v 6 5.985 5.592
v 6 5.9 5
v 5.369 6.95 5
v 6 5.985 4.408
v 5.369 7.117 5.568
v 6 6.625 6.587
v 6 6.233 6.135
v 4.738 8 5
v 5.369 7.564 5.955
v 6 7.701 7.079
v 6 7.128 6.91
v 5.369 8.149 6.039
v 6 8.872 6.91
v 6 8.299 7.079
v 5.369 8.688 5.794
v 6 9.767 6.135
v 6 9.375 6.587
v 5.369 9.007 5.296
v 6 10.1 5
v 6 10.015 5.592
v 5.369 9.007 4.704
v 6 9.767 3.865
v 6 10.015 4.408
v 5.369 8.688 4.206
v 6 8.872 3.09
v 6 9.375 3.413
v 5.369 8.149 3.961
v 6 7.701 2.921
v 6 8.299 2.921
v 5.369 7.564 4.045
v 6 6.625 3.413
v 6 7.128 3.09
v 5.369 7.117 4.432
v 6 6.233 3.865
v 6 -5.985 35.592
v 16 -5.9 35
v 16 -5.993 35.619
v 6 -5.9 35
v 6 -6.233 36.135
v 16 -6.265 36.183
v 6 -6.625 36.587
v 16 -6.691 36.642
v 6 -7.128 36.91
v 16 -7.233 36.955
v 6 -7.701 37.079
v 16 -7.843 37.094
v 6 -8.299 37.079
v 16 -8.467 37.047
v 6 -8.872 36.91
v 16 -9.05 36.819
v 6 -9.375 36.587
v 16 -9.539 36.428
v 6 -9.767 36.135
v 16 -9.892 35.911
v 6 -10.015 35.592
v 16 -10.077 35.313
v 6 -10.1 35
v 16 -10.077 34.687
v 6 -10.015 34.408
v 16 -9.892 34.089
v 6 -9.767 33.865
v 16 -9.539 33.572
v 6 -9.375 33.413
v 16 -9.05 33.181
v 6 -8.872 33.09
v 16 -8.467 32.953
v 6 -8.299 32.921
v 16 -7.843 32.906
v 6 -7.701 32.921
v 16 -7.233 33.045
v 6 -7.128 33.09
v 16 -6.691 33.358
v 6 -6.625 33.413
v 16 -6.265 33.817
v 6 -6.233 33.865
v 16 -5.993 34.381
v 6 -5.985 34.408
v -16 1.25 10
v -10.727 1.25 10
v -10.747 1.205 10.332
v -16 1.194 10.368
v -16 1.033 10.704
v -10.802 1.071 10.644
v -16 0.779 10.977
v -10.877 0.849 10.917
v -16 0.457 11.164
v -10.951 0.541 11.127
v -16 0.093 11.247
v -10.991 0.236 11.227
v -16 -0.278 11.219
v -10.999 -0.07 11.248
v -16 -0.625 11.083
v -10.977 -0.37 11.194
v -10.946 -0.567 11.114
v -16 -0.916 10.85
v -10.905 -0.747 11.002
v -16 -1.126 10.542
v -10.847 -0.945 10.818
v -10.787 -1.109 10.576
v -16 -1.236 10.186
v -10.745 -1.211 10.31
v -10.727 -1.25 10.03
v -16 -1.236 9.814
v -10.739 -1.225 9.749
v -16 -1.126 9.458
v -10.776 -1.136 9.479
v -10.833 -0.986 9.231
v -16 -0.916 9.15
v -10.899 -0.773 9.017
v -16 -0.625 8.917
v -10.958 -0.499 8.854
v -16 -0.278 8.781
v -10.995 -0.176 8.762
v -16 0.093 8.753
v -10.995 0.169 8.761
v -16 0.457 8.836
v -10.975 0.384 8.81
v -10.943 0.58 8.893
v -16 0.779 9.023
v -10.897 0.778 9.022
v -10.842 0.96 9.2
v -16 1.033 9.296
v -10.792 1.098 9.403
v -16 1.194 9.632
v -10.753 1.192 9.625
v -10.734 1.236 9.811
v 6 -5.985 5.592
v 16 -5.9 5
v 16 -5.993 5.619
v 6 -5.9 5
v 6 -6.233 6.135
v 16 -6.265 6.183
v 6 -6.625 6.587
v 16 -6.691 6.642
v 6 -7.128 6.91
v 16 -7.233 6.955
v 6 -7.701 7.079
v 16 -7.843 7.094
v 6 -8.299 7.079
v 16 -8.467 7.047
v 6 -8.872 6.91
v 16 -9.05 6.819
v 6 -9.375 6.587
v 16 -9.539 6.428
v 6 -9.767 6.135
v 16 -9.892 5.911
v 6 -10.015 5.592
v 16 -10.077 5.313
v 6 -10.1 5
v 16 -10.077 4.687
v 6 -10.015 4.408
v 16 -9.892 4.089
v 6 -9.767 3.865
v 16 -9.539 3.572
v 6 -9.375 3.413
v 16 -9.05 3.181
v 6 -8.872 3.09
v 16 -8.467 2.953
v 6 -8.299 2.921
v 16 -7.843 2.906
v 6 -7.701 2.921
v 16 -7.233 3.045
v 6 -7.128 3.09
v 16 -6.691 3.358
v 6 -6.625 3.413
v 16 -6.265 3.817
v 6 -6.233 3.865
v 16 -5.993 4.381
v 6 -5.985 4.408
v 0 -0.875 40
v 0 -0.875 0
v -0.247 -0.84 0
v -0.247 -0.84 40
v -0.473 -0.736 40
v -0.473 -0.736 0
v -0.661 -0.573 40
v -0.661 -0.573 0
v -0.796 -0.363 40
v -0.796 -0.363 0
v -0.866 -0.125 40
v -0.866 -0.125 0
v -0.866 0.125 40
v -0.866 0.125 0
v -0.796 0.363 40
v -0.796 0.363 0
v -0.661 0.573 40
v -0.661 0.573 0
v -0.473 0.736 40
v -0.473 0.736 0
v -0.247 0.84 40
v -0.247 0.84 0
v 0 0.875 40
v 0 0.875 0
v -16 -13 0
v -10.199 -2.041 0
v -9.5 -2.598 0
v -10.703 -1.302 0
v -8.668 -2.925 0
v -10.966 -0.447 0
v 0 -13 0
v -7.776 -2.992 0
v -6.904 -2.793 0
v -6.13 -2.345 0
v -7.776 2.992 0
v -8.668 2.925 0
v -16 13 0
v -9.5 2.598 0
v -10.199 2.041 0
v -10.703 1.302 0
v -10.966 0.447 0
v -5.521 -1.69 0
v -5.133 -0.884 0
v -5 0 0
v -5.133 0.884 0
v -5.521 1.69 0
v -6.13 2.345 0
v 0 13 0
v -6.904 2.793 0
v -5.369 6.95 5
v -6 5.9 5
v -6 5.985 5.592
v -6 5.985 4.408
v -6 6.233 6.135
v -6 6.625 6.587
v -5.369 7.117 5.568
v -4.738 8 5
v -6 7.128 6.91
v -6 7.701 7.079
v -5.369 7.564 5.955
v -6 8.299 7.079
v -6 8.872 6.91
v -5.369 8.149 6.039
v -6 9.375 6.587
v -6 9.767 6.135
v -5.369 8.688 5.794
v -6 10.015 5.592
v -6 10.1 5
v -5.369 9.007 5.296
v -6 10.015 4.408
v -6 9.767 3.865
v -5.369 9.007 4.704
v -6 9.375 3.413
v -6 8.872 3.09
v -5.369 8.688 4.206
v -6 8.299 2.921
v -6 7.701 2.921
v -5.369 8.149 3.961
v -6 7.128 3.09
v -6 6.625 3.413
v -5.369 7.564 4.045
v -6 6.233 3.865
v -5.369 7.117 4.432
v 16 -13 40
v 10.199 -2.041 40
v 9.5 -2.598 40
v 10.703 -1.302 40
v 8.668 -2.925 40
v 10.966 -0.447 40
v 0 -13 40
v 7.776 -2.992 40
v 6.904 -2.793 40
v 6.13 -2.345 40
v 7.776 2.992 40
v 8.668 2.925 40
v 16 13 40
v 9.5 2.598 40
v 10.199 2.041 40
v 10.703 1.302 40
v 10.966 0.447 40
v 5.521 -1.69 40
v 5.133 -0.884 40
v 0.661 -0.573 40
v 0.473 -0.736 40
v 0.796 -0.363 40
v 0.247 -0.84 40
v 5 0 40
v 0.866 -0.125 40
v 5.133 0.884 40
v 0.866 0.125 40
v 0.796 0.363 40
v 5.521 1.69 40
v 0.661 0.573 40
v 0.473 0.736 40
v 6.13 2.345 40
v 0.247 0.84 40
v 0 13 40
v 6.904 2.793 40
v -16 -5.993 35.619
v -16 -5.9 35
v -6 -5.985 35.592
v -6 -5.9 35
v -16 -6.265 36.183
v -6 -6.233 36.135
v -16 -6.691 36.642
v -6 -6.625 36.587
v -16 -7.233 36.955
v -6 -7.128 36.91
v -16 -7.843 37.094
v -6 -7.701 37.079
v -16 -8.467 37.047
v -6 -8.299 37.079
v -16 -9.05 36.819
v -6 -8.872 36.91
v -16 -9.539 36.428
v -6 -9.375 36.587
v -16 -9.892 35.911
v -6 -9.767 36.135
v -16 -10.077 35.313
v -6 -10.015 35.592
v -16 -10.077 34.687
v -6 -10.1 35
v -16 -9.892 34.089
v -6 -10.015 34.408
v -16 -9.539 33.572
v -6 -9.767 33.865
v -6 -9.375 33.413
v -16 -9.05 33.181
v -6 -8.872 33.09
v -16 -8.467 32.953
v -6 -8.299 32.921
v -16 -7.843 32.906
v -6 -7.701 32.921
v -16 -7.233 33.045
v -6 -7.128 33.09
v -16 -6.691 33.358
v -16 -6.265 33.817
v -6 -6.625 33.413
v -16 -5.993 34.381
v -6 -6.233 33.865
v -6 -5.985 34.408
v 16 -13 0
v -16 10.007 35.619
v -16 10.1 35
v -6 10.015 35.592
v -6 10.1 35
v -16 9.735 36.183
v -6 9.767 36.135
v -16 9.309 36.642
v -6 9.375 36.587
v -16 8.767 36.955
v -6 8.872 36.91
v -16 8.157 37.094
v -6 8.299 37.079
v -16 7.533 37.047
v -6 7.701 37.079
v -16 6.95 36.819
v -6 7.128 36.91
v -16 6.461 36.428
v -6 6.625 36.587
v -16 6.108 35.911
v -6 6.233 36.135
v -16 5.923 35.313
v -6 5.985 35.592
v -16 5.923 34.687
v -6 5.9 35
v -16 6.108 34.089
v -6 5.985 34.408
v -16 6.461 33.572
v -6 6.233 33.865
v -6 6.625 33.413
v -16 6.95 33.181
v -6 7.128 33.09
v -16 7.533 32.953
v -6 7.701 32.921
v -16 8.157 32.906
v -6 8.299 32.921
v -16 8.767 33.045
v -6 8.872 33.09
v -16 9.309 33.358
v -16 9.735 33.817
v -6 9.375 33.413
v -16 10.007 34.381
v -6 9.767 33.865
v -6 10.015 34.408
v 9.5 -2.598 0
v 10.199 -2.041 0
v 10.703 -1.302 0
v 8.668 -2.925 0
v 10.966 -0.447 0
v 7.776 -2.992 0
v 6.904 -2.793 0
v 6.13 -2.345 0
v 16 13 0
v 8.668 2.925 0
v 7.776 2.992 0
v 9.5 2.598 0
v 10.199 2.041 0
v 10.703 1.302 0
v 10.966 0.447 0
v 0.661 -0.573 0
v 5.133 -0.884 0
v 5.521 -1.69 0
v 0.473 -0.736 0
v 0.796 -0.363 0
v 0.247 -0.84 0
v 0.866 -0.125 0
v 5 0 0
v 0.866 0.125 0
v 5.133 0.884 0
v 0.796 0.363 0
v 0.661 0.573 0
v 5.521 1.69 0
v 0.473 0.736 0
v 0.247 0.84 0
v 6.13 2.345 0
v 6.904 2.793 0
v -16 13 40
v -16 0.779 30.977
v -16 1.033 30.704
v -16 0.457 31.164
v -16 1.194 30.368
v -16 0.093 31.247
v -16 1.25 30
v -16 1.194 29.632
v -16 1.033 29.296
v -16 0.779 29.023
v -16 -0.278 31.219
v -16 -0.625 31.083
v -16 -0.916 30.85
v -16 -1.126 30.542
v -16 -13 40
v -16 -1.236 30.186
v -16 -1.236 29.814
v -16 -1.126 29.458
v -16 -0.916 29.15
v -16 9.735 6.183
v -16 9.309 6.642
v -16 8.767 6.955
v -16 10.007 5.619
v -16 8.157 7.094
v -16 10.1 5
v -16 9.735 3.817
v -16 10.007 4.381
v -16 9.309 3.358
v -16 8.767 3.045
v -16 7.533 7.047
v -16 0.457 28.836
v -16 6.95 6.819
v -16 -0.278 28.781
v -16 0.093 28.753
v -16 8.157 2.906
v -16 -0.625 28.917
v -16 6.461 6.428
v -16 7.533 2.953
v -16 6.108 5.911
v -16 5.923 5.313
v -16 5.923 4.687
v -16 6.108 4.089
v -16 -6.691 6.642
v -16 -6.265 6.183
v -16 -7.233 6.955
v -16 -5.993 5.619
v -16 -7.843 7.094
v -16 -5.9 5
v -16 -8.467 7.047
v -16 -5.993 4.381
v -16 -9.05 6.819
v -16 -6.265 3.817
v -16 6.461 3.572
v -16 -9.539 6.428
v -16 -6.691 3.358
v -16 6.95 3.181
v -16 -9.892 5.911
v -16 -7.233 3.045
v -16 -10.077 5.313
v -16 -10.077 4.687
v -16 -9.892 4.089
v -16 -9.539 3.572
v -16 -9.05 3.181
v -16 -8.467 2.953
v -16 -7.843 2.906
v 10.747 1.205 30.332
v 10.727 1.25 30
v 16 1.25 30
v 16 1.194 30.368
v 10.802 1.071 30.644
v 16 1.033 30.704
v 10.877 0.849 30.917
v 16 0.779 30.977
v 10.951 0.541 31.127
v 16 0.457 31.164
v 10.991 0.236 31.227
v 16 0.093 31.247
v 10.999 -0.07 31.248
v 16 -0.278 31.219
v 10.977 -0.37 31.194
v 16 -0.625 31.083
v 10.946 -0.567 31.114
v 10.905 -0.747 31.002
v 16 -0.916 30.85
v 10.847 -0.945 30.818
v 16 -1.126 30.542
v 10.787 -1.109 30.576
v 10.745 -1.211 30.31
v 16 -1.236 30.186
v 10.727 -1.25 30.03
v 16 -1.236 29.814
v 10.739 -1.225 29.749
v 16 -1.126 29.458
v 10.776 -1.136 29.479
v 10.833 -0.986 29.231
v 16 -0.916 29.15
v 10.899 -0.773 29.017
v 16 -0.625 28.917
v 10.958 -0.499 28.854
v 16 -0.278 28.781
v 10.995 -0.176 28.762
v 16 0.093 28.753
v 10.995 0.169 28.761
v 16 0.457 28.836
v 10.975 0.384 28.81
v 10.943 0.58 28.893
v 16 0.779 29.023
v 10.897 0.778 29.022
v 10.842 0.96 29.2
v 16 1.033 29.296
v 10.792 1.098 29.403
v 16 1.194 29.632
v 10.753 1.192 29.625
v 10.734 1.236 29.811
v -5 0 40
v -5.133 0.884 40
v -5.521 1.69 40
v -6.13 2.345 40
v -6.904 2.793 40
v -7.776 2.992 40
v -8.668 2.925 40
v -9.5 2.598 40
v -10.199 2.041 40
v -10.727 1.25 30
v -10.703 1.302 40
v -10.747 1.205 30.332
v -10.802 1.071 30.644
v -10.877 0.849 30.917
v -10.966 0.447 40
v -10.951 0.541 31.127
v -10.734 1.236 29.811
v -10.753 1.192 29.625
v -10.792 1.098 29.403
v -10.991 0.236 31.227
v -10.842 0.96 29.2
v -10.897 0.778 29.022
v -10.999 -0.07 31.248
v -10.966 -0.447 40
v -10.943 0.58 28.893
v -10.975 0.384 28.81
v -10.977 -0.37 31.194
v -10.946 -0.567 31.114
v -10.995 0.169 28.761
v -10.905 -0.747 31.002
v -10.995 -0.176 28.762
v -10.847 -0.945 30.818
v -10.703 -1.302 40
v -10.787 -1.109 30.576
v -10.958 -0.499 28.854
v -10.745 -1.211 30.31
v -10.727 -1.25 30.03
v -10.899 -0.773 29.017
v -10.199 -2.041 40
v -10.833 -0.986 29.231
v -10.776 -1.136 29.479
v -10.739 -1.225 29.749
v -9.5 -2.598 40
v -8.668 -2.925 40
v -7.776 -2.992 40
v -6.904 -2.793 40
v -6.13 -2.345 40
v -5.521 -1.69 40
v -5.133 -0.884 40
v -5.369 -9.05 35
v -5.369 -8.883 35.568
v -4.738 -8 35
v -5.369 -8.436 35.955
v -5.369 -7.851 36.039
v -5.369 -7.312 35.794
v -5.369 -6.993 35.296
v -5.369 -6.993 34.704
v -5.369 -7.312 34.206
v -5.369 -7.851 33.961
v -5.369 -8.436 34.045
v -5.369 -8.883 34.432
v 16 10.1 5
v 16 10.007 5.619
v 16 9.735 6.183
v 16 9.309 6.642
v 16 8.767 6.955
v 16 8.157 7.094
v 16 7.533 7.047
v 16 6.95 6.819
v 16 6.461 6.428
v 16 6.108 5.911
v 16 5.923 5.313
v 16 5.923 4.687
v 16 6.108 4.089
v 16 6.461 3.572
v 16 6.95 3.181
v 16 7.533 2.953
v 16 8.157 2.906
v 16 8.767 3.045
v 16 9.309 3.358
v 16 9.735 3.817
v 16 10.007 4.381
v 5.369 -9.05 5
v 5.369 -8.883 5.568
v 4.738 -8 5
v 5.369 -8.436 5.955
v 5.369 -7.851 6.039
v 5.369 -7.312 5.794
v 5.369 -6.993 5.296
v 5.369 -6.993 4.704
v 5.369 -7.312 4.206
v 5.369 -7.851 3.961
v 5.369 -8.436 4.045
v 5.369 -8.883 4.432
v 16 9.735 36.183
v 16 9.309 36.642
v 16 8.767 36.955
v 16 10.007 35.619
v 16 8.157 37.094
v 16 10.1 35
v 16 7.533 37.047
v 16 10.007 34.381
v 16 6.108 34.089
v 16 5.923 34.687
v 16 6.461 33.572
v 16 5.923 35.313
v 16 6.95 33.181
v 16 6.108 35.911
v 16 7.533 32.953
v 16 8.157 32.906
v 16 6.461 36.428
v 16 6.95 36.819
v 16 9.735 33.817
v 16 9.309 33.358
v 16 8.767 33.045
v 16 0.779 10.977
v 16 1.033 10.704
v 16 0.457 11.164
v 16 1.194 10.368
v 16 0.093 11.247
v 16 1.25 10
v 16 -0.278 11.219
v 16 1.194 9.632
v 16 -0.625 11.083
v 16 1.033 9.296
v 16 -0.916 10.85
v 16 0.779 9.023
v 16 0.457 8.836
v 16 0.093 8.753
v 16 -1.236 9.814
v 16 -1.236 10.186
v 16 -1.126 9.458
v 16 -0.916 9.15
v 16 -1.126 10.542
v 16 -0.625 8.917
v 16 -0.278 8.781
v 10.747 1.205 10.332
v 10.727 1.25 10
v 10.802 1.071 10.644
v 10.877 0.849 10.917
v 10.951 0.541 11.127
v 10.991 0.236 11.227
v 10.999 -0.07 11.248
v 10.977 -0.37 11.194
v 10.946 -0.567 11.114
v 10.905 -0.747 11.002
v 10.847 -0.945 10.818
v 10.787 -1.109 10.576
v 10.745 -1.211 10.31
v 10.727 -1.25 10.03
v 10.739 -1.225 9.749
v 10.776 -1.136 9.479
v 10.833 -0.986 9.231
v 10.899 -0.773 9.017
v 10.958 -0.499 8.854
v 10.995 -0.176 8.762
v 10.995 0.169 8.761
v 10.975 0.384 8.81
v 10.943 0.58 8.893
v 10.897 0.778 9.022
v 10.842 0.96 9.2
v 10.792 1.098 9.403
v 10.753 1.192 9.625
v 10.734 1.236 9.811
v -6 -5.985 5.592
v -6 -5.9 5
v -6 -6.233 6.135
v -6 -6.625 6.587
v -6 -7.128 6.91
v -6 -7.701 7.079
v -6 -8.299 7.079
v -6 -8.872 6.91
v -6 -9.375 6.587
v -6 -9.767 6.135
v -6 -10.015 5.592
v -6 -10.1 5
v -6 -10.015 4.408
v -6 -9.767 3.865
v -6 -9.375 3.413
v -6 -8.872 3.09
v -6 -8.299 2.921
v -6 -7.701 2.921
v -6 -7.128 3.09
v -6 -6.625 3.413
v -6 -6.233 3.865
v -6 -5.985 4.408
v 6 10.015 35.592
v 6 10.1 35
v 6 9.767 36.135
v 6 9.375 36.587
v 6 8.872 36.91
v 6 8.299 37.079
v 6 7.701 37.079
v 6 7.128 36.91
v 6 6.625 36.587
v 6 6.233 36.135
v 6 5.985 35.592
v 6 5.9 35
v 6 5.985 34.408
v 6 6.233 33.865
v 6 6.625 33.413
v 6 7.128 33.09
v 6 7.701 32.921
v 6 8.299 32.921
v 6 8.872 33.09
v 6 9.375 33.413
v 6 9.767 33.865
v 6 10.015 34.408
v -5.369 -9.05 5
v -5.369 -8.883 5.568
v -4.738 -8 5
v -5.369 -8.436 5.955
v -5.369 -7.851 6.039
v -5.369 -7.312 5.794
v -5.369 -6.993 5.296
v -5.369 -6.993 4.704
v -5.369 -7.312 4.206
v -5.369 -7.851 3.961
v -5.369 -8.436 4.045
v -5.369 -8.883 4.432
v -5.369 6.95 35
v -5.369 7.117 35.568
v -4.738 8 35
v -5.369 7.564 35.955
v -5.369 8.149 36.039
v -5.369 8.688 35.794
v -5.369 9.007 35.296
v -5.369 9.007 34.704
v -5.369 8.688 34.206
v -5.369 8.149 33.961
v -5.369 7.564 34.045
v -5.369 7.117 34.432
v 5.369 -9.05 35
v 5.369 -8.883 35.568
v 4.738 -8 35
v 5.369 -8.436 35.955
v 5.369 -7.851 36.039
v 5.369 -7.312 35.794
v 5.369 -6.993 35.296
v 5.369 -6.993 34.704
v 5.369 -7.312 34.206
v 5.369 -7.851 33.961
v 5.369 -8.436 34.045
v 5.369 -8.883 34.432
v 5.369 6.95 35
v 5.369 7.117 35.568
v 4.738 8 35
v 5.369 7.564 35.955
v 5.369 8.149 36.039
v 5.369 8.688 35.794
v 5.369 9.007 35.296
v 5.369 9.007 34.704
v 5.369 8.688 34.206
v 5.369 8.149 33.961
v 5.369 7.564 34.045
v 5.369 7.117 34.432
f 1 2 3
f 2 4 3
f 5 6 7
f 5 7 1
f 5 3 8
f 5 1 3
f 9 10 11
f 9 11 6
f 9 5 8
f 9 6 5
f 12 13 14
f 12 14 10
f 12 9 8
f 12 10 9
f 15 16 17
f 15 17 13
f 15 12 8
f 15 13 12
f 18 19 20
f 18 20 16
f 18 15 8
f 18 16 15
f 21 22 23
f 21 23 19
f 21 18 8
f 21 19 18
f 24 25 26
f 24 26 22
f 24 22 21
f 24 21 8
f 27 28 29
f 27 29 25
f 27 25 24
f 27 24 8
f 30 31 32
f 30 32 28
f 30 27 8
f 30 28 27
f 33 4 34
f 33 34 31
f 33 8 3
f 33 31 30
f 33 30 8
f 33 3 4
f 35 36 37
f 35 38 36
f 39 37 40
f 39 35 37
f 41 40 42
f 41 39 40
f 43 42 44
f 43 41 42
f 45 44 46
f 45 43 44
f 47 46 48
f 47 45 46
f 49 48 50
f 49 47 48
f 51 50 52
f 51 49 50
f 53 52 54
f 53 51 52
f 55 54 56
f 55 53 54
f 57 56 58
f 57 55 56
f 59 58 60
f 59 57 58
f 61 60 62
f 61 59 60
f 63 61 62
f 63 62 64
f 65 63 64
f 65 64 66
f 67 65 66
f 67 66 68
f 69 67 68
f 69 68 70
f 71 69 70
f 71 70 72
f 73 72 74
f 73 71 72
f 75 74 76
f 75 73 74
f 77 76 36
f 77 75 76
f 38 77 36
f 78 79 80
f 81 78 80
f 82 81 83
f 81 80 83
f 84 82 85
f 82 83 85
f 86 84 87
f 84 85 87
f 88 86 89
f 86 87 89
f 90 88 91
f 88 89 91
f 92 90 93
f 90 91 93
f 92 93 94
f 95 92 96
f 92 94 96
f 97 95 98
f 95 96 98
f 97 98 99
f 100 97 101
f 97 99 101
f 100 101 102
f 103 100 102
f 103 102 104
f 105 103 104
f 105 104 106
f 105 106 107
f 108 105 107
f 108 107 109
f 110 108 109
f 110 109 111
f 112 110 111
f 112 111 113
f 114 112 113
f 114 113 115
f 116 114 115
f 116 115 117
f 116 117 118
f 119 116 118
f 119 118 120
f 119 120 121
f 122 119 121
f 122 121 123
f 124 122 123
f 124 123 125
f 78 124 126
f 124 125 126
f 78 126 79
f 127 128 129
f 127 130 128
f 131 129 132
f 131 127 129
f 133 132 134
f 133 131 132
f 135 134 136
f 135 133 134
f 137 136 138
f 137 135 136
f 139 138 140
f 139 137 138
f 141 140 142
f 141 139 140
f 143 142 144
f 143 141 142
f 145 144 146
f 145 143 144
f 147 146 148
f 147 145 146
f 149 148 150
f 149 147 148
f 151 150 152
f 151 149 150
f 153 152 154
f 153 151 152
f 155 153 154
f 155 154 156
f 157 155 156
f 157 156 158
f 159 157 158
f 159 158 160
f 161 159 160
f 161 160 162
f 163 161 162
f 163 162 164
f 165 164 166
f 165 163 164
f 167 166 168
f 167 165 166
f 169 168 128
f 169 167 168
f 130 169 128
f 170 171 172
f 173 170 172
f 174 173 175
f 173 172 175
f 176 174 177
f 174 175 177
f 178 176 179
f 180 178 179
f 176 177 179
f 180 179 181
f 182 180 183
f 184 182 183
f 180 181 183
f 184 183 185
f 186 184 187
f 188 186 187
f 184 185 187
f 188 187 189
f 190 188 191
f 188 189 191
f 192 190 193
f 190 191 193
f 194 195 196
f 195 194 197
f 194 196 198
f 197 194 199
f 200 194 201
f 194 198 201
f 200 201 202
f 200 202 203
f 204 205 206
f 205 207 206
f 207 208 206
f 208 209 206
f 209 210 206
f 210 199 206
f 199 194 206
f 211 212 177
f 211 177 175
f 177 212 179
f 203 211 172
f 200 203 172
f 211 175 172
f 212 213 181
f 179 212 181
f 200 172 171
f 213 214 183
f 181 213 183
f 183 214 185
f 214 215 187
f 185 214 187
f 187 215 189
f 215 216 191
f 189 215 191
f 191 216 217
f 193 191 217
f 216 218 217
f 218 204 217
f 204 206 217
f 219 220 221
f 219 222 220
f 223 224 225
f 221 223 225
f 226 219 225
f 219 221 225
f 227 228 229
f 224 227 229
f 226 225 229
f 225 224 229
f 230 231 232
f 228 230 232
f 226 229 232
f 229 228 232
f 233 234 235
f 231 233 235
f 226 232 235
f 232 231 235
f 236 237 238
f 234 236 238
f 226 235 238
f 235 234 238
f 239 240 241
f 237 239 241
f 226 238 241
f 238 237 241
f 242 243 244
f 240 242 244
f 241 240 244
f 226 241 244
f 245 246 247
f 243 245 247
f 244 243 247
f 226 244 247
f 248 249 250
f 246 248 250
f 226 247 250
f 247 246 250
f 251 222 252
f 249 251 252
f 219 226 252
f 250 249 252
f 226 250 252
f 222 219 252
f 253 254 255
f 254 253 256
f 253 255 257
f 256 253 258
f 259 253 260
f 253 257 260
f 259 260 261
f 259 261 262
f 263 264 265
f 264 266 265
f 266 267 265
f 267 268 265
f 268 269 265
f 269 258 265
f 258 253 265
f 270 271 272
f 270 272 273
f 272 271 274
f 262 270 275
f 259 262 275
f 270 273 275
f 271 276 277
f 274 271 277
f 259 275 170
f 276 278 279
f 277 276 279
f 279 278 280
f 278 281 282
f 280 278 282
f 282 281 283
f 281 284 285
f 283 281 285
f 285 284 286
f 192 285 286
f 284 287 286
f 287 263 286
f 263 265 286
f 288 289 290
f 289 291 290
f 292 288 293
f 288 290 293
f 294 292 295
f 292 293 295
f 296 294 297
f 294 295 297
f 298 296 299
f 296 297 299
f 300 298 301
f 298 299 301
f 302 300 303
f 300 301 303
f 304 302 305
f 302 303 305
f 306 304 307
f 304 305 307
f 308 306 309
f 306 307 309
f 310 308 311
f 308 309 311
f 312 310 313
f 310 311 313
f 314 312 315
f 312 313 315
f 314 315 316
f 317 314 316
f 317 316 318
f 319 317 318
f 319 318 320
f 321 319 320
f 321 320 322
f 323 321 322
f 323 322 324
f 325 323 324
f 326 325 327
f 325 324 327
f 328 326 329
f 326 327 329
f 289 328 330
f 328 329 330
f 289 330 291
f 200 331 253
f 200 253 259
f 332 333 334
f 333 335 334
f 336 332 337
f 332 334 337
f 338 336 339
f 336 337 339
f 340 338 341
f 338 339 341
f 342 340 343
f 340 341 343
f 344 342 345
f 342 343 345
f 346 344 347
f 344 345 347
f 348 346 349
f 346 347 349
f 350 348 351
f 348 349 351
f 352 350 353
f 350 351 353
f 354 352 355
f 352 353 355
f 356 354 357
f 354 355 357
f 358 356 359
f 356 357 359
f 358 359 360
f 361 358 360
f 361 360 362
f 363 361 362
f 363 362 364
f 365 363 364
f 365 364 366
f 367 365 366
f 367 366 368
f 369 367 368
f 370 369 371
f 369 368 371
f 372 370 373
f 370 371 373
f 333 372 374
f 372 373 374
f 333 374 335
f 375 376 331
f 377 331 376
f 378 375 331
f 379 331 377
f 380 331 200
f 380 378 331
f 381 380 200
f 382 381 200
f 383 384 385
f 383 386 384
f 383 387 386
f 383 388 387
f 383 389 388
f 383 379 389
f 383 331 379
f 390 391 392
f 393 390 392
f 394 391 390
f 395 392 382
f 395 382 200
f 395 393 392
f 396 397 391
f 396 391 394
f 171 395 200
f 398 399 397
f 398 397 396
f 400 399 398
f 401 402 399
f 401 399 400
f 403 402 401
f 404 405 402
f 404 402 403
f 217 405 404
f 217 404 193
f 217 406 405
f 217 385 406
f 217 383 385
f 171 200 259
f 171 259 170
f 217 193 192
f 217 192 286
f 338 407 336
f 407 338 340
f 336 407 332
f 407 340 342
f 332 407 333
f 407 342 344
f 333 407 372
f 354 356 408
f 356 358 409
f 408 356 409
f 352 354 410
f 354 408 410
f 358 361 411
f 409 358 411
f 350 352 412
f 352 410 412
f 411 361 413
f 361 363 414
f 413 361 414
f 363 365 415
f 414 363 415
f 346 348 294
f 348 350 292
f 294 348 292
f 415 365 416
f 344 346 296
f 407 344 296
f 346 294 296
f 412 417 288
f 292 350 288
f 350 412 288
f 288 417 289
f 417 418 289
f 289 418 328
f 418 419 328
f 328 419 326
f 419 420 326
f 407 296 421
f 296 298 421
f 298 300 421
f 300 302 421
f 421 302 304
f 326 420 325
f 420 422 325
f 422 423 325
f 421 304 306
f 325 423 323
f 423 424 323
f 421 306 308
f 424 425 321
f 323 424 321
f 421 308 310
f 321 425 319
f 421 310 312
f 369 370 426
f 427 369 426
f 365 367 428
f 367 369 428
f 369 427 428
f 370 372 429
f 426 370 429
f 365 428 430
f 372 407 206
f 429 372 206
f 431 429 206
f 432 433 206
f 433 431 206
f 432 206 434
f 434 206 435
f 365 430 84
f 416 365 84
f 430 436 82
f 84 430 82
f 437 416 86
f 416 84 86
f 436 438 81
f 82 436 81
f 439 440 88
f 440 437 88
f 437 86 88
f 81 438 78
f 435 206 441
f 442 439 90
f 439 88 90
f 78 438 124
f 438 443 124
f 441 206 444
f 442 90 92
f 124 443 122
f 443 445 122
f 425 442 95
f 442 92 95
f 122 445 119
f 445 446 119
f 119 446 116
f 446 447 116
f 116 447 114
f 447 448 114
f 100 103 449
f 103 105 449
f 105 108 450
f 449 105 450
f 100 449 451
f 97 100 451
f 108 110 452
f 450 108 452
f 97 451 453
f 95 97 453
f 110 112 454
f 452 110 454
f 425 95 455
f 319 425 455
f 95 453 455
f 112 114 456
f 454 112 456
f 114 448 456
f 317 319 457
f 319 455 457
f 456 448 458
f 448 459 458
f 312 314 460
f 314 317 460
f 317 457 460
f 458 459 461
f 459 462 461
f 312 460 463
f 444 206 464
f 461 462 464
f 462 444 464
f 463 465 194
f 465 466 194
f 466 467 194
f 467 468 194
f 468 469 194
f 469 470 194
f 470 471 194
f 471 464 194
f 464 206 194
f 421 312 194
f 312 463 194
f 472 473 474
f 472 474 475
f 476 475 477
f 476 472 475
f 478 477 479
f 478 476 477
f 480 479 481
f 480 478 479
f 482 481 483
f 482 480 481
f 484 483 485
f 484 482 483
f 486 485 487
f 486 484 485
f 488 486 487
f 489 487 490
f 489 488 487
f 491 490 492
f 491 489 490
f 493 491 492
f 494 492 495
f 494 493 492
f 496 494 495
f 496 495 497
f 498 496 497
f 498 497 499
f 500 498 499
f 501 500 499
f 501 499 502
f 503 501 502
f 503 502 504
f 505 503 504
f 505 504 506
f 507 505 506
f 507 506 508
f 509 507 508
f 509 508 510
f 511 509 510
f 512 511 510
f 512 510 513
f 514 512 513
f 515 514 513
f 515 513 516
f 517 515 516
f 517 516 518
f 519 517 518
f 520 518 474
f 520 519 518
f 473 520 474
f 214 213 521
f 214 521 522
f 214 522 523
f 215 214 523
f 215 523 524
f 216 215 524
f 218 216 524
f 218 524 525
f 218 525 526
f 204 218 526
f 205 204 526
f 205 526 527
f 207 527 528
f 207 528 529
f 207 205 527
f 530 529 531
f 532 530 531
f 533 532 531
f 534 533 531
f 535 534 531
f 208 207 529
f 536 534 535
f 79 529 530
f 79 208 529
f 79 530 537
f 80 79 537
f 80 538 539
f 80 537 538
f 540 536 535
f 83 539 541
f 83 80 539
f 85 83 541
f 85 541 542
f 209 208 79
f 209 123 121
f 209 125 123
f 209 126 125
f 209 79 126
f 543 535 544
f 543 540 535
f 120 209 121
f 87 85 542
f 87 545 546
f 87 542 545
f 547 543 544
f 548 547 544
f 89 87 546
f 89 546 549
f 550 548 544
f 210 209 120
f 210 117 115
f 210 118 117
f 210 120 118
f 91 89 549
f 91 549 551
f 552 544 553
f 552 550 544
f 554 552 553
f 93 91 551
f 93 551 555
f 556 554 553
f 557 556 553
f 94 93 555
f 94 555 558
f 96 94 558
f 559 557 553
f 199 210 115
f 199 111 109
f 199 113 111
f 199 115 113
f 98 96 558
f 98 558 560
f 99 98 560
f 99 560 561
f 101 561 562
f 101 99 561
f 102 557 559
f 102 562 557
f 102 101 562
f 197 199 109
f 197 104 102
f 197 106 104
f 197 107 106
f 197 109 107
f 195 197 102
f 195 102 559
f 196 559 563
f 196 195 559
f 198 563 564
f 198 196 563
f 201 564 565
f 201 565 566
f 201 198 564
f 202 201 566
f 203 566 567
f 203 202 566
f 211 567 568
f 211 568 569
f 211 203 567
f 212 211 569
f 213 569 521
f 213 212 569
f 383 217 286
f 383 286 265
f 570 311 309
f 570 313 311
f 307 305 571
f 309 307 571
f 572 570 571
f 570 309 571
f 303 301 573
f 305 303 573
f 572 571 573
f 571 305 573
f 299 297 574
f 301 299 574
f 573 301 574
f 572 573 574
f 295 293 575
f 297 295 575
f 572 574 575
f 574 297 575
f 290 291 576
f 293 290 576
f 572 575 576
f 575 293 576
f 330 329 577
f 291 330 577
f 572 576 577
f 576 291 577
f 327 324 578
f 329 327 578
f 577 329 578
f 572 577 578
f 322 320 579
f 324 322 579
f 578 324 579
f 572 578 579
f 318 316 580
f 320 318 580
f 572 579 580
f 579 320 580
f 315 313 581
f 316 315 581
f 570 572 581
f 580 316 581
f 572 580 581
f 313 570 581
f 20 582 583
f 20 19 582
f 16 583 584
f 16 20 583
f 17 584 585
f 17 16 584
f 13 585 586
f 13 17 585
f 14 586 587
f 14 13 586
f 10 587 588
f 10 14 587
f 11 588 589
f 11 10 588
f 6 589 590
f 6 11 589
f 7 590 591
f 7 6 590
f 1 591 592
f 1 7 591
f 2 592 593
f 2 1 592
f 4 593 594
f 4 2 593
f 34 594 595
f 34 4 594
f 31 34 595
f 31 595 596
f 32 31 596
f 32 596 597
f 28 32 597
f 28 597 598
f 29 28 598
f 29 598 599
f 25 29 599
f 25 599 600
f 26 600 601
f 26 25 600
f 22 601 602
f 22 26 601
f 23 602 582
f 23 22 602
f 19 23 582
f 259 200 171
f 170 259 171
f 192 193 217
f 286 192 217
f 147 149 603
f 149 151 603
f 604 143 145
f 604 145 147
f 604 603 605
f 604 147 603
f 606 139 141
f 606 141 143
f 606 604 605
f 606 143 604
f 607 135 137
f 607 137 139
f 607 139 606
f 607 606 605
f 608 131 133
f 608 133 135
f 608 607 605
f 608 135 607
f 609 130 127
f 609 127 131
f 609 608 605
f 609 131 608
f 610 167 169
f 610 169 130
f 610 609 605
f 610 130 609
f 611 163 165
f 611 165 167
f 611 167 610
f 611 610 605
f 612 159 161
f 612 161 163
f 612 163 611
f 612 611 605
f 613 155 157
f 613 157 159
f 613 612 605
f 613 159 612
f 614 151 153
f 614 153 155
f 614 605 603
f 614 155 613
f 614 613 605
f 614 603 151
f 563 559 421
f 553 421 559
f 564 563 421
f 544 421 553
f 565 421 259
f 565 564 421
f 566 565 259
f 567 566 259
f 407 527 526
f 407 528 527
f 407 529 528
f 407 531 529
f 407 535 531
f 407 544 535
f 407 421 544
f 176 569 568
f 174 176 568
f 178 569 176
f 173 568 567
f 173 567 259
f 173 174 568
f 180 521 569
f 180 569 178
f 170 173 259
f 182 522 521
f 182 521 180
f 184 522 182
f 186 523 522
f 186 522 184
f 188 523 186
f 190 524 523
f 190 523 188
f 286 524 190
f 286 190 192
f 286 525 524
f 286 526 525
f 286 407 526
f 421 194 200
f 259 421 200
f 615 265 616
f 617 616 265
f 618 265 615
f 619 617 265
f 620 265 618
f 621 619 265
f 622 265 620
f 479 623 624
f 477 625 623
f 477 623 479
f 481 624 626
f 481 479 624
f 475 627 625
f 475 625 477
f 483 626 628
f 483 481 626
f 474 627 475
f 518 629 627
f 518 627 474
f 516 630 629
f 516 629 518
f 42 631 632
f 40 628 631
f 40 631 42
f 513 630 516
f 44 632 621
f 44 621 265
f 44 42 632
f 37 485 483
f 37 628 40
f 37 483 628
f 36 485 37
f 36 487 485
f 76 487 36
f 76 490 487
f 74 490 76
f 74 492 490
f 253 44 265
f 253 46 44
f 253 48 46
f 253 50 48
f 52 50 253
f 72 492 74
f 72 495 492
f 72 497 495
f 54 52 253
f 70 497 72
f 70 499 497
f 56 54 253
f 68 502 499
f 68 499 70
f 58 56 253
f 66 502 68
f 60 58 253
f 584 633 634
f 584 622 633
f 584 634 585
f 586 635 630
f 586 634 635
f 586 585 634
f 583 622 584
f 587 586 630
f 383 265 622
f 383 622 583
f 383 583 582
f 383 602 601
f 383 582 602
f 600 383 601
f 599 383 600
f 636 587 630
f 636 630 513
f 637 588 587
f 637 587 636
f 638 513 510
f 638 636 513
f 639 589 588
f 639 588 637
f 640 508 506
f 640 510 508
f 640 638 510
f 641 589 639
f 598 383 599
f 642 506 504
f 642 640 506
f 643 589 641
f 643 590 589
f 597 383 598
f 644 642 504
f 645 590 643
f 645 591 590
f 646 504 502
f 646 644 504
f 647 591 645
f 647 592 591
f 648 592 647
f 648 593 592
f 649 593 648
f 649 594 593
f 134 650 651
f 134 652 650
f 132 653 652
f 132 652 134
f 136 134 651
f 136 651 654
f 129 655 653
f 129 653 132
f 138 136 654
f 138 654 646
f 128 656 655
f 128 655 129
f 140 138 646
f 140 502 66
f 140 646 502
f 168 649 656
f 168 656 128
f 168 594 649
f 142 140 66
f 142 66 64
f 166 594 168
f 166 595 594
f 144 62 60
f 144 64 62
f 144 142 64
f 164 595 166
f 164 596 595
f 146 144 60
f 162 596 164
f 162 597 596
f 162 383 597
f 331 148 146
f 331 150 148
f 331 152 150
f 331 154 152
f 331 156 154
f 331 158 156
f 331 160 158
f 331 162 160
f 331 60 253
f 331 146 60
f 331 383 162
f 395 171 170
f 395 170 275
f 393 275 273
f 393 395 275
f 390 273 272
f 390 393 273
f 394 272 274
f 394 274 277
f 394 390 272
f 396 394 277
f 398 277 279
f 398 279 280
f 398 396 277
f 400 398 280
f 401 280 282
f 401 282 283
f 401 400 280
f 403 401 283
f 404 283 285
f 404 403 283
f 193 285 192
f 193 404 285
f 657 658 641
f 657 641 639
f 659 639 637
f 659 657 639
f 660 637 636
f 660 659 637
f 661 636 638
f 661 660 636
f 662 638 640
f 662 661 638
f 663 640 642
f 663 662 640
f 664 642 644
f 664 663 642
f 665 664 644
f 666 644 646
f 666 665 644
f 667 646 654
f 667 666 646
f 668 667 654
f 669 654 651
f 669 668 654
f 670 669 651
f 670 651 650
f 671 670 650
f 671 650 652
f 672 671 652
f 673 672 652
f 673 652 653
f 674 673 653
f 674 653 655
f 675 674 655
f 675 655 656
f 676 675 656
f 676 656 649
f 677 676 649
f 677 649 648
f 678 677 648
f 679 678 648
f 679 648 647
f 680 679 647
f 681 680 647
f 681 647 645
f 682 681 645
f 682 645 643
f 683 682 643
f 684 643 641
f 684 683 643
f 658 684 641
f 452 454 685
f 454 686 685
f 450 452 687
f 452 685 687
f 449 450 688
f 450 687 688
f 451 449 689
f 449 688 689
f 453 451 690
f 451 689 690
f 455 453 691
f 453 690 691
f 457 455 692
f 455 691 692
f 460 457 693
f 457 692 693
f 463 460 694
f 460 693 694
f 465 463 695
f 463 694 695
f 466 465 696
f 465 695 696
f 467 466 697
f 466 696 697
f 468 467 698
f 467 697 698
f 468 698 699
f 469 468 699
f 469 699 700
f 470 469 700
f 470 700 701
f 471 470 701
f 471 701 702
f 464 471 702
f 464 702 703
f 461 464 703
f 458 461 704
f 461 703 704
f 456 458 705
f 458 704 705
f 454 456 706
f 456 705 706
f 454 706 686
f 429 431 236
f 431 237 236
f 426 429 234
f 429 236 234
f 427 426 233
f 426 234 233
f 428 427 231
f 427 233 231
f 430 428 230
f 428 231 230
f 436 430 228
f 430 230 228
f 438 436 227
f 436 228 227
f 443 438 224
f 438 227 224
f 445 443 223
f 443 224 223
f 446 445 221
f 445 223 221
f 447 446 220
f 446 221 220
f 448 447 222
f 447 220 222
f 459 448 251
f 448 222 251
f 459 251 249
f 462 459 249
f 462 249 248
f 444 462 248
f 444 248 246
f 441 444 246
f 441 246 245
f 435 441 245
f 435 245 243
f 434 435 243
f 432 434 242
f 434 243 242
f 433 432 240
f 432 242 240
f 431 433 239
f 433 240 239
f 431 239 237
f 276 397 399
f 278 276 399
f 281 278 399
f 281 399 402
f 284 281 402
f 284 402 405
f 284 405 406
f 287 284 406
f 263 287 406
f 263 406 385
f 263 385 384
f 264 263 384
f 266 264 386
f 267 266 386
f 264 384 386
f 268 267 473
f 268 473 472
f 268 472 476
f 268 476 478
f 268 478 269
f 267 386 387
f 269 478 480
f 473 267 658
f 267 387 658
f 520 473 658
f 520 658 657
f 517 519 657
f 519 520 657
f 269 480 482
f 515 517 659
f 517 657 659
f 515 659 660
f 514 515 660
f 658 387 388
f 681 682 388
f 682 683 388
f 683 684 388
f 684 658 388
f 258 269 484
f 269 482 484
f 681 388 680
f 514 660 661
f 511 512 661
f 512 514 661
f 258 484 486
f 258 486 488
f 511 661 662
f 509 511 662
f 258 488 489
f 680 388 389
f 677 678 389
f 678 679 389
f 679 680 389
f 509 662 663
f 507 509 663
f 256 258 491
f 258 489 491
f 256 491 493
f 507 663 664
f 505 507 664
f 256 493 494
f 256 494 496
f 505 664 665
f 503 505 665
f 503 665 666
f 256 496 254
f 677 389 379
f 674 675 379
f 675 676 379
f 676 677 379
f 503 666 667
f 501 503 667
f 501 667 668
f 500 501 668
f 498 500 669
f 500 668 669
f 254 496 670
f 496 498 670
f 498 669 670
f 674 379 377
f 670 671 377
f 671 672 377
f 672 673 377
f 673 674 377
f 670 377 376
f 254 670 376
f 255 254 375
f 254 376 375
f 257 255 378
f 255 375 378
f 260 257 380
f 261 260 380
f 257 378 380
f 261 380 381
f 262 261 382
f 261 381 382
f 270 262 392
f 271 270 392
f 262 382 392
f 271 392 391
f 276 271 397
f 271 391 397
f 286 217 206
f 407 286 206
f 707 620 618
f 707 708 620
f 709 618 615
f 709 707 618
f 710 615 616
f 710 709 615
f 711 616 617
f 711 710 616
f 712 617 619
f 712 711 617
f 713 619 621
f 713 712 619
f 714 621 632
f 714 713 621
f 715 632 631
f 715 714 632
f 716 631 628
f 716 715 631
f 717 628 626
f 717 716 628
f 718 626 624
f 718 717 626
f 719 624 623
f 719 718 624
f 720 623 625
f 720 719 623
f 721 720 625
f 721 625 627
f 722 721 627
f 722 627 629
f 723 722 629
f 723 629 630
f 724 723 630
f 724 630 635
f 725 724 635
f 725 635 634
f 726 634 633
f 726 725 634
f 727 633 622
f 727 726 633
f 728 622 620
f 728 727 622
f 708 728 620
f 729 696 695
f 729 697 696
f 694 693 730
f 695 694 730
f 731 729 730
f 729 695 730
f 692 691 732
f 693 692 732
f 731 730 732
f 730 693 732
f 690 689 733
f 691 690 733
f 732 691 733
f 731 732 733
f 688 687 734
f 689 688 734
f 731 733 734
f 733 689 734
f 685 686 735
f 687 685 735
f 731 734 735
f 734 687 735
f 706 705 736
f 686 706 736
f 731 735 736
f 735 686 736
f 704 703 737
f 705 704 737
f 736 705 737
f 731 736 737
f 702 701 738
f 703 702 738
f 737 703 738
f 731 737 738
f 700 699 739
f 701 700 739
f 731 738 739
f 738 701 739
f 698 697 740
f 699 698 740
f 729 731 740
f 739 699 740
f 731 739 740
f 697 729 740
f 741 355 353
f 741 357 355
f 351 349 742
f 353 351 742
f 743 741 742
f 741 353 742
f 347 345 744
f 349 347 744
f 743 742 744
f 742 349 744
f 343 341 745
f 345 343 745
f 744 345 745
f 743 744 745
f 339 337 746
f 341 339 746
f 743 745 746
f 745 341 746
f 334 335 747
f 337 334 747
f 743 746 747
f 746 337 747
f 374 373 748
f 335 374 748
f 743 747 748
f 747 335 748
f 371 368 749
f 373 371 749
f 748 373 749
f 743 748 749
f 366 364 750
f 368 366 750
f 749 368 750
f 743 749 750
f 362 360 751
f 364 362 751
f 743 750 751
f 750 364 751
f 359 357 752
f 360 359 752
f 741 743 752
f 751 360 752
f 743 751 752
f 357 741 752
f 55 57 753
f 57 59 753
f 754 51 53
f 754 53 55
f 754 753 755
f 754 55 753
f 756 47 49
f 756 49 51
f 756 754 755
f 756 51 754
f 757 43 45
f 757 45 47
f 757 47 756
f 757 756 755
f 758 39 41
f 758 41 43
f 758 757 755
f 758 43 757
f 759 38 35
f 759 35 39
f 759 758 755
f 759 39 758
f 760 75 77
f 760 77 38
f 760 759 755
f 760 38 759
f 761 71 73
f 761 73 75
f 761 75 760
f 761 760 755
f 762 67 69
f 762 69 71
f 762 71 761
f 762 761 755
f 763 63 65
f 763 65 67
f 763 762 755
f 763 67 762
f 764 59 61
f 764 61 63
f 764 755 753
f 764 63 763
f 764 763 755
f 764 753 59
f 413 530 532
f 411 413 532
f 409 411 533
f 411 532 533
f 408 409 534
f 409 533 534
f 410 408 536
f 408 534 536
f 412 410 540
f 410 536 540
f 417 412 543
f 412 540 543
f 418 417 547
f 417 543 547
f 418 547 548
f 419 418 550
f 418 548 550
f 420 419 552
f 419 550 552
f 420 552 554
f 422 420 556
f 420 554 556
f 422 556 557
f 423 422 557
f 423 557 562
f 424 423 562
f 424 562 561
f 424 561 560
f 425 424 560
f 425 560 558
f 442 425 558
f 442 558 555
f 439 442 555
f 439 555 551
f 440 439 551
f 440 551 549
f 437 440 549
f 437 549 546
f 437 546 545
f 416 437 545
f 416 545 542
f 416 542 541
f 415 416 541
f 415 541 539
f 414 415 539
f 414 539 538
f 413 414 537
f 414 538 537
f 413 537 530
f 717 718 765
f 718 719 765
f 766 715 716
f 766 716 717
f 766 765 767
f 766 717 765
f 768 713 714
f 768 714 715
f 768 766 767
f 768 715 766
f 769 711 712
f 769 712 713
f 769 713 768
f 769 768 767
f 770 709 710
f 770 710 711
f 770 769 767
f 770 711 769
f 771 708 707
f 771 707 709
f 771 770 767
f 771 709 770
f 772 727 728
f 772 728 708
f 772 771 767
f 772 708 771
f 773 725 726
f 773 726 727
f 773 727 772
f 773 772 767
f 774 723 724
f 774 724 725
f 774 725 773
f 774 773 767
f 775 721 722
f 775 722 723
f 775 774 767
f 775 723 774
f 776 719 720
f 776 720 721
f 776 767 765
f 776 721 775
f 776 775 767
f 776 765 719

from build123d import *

# Parameters (mm, degrees)
F0_R     = 3
F1_DEPTH = 40
F3_D     = 4.2
F3_DEPTH = 10
F3_TIP   = 1.2618073
F4_D     = 2.5
F4_DEPTH = 10
F4_TIP   = 0.7510757738


with BuildPart() as f1:
    # F0 (on Top) → F1 (new body)
    with BuildSketch(Plane.XY):
        with BuildLine():
            Line((0, 13), (-16, 13))
            Line((-16, 13), (-16, -13))
            Line((-16, -13), (0, -13))
            Line((0, -13), (0, -0.875))
            ThreePointArc((0, -0.875), (-0.875, 0), (0, 0.875))
            Line((0, 0.875), (0, 13))
        make_face()
        with Locations((-8, 0)):
            Circle(F0_R, mode=Mode.SUBTRACT)
    extrude(amount=F1_DEPTH)

    # F3
    with Locations(Plane(origin=(-16, 0, 0), x_dir=(0, -1, 0), z_dir=(-1, 0, 0))):
        with Locations((-8, 35), (8, 35), (8, 5), (-8, 5)):
            Hole(F3_D / 2, depth=F3_DEPTH)
            with Locations((0, 0, -(F3_DEPTH + F3_TIP / 2))):  # 118° drill point
                Cone(0, F3_D / 2, F3_TIP, mode=Mode.SUBTRACT)

    # F4
    with Locations(Plane(origin=(-16, 0, 0), x_dir=(0, -1, 0), z_dir=(-1, 0, 0))):
        with Locations((0, 30), (0, 10)):
            Hole(F4_D / 2, depth=F4_DEPTH)
            with Locations((0, 0, -(F4_DEPTH + F4_TIP / 2))):  # 118° drill point
                Cone(0, F4_D / 2, F4_TIP, mode=Mode.SUBTRACT)


with BuildPart() as f5_1:
    # F5: instance of F1
    add(f1.part.mirror(Plane.YZ))


solid = Compound([f1.part, f5_1.part])
